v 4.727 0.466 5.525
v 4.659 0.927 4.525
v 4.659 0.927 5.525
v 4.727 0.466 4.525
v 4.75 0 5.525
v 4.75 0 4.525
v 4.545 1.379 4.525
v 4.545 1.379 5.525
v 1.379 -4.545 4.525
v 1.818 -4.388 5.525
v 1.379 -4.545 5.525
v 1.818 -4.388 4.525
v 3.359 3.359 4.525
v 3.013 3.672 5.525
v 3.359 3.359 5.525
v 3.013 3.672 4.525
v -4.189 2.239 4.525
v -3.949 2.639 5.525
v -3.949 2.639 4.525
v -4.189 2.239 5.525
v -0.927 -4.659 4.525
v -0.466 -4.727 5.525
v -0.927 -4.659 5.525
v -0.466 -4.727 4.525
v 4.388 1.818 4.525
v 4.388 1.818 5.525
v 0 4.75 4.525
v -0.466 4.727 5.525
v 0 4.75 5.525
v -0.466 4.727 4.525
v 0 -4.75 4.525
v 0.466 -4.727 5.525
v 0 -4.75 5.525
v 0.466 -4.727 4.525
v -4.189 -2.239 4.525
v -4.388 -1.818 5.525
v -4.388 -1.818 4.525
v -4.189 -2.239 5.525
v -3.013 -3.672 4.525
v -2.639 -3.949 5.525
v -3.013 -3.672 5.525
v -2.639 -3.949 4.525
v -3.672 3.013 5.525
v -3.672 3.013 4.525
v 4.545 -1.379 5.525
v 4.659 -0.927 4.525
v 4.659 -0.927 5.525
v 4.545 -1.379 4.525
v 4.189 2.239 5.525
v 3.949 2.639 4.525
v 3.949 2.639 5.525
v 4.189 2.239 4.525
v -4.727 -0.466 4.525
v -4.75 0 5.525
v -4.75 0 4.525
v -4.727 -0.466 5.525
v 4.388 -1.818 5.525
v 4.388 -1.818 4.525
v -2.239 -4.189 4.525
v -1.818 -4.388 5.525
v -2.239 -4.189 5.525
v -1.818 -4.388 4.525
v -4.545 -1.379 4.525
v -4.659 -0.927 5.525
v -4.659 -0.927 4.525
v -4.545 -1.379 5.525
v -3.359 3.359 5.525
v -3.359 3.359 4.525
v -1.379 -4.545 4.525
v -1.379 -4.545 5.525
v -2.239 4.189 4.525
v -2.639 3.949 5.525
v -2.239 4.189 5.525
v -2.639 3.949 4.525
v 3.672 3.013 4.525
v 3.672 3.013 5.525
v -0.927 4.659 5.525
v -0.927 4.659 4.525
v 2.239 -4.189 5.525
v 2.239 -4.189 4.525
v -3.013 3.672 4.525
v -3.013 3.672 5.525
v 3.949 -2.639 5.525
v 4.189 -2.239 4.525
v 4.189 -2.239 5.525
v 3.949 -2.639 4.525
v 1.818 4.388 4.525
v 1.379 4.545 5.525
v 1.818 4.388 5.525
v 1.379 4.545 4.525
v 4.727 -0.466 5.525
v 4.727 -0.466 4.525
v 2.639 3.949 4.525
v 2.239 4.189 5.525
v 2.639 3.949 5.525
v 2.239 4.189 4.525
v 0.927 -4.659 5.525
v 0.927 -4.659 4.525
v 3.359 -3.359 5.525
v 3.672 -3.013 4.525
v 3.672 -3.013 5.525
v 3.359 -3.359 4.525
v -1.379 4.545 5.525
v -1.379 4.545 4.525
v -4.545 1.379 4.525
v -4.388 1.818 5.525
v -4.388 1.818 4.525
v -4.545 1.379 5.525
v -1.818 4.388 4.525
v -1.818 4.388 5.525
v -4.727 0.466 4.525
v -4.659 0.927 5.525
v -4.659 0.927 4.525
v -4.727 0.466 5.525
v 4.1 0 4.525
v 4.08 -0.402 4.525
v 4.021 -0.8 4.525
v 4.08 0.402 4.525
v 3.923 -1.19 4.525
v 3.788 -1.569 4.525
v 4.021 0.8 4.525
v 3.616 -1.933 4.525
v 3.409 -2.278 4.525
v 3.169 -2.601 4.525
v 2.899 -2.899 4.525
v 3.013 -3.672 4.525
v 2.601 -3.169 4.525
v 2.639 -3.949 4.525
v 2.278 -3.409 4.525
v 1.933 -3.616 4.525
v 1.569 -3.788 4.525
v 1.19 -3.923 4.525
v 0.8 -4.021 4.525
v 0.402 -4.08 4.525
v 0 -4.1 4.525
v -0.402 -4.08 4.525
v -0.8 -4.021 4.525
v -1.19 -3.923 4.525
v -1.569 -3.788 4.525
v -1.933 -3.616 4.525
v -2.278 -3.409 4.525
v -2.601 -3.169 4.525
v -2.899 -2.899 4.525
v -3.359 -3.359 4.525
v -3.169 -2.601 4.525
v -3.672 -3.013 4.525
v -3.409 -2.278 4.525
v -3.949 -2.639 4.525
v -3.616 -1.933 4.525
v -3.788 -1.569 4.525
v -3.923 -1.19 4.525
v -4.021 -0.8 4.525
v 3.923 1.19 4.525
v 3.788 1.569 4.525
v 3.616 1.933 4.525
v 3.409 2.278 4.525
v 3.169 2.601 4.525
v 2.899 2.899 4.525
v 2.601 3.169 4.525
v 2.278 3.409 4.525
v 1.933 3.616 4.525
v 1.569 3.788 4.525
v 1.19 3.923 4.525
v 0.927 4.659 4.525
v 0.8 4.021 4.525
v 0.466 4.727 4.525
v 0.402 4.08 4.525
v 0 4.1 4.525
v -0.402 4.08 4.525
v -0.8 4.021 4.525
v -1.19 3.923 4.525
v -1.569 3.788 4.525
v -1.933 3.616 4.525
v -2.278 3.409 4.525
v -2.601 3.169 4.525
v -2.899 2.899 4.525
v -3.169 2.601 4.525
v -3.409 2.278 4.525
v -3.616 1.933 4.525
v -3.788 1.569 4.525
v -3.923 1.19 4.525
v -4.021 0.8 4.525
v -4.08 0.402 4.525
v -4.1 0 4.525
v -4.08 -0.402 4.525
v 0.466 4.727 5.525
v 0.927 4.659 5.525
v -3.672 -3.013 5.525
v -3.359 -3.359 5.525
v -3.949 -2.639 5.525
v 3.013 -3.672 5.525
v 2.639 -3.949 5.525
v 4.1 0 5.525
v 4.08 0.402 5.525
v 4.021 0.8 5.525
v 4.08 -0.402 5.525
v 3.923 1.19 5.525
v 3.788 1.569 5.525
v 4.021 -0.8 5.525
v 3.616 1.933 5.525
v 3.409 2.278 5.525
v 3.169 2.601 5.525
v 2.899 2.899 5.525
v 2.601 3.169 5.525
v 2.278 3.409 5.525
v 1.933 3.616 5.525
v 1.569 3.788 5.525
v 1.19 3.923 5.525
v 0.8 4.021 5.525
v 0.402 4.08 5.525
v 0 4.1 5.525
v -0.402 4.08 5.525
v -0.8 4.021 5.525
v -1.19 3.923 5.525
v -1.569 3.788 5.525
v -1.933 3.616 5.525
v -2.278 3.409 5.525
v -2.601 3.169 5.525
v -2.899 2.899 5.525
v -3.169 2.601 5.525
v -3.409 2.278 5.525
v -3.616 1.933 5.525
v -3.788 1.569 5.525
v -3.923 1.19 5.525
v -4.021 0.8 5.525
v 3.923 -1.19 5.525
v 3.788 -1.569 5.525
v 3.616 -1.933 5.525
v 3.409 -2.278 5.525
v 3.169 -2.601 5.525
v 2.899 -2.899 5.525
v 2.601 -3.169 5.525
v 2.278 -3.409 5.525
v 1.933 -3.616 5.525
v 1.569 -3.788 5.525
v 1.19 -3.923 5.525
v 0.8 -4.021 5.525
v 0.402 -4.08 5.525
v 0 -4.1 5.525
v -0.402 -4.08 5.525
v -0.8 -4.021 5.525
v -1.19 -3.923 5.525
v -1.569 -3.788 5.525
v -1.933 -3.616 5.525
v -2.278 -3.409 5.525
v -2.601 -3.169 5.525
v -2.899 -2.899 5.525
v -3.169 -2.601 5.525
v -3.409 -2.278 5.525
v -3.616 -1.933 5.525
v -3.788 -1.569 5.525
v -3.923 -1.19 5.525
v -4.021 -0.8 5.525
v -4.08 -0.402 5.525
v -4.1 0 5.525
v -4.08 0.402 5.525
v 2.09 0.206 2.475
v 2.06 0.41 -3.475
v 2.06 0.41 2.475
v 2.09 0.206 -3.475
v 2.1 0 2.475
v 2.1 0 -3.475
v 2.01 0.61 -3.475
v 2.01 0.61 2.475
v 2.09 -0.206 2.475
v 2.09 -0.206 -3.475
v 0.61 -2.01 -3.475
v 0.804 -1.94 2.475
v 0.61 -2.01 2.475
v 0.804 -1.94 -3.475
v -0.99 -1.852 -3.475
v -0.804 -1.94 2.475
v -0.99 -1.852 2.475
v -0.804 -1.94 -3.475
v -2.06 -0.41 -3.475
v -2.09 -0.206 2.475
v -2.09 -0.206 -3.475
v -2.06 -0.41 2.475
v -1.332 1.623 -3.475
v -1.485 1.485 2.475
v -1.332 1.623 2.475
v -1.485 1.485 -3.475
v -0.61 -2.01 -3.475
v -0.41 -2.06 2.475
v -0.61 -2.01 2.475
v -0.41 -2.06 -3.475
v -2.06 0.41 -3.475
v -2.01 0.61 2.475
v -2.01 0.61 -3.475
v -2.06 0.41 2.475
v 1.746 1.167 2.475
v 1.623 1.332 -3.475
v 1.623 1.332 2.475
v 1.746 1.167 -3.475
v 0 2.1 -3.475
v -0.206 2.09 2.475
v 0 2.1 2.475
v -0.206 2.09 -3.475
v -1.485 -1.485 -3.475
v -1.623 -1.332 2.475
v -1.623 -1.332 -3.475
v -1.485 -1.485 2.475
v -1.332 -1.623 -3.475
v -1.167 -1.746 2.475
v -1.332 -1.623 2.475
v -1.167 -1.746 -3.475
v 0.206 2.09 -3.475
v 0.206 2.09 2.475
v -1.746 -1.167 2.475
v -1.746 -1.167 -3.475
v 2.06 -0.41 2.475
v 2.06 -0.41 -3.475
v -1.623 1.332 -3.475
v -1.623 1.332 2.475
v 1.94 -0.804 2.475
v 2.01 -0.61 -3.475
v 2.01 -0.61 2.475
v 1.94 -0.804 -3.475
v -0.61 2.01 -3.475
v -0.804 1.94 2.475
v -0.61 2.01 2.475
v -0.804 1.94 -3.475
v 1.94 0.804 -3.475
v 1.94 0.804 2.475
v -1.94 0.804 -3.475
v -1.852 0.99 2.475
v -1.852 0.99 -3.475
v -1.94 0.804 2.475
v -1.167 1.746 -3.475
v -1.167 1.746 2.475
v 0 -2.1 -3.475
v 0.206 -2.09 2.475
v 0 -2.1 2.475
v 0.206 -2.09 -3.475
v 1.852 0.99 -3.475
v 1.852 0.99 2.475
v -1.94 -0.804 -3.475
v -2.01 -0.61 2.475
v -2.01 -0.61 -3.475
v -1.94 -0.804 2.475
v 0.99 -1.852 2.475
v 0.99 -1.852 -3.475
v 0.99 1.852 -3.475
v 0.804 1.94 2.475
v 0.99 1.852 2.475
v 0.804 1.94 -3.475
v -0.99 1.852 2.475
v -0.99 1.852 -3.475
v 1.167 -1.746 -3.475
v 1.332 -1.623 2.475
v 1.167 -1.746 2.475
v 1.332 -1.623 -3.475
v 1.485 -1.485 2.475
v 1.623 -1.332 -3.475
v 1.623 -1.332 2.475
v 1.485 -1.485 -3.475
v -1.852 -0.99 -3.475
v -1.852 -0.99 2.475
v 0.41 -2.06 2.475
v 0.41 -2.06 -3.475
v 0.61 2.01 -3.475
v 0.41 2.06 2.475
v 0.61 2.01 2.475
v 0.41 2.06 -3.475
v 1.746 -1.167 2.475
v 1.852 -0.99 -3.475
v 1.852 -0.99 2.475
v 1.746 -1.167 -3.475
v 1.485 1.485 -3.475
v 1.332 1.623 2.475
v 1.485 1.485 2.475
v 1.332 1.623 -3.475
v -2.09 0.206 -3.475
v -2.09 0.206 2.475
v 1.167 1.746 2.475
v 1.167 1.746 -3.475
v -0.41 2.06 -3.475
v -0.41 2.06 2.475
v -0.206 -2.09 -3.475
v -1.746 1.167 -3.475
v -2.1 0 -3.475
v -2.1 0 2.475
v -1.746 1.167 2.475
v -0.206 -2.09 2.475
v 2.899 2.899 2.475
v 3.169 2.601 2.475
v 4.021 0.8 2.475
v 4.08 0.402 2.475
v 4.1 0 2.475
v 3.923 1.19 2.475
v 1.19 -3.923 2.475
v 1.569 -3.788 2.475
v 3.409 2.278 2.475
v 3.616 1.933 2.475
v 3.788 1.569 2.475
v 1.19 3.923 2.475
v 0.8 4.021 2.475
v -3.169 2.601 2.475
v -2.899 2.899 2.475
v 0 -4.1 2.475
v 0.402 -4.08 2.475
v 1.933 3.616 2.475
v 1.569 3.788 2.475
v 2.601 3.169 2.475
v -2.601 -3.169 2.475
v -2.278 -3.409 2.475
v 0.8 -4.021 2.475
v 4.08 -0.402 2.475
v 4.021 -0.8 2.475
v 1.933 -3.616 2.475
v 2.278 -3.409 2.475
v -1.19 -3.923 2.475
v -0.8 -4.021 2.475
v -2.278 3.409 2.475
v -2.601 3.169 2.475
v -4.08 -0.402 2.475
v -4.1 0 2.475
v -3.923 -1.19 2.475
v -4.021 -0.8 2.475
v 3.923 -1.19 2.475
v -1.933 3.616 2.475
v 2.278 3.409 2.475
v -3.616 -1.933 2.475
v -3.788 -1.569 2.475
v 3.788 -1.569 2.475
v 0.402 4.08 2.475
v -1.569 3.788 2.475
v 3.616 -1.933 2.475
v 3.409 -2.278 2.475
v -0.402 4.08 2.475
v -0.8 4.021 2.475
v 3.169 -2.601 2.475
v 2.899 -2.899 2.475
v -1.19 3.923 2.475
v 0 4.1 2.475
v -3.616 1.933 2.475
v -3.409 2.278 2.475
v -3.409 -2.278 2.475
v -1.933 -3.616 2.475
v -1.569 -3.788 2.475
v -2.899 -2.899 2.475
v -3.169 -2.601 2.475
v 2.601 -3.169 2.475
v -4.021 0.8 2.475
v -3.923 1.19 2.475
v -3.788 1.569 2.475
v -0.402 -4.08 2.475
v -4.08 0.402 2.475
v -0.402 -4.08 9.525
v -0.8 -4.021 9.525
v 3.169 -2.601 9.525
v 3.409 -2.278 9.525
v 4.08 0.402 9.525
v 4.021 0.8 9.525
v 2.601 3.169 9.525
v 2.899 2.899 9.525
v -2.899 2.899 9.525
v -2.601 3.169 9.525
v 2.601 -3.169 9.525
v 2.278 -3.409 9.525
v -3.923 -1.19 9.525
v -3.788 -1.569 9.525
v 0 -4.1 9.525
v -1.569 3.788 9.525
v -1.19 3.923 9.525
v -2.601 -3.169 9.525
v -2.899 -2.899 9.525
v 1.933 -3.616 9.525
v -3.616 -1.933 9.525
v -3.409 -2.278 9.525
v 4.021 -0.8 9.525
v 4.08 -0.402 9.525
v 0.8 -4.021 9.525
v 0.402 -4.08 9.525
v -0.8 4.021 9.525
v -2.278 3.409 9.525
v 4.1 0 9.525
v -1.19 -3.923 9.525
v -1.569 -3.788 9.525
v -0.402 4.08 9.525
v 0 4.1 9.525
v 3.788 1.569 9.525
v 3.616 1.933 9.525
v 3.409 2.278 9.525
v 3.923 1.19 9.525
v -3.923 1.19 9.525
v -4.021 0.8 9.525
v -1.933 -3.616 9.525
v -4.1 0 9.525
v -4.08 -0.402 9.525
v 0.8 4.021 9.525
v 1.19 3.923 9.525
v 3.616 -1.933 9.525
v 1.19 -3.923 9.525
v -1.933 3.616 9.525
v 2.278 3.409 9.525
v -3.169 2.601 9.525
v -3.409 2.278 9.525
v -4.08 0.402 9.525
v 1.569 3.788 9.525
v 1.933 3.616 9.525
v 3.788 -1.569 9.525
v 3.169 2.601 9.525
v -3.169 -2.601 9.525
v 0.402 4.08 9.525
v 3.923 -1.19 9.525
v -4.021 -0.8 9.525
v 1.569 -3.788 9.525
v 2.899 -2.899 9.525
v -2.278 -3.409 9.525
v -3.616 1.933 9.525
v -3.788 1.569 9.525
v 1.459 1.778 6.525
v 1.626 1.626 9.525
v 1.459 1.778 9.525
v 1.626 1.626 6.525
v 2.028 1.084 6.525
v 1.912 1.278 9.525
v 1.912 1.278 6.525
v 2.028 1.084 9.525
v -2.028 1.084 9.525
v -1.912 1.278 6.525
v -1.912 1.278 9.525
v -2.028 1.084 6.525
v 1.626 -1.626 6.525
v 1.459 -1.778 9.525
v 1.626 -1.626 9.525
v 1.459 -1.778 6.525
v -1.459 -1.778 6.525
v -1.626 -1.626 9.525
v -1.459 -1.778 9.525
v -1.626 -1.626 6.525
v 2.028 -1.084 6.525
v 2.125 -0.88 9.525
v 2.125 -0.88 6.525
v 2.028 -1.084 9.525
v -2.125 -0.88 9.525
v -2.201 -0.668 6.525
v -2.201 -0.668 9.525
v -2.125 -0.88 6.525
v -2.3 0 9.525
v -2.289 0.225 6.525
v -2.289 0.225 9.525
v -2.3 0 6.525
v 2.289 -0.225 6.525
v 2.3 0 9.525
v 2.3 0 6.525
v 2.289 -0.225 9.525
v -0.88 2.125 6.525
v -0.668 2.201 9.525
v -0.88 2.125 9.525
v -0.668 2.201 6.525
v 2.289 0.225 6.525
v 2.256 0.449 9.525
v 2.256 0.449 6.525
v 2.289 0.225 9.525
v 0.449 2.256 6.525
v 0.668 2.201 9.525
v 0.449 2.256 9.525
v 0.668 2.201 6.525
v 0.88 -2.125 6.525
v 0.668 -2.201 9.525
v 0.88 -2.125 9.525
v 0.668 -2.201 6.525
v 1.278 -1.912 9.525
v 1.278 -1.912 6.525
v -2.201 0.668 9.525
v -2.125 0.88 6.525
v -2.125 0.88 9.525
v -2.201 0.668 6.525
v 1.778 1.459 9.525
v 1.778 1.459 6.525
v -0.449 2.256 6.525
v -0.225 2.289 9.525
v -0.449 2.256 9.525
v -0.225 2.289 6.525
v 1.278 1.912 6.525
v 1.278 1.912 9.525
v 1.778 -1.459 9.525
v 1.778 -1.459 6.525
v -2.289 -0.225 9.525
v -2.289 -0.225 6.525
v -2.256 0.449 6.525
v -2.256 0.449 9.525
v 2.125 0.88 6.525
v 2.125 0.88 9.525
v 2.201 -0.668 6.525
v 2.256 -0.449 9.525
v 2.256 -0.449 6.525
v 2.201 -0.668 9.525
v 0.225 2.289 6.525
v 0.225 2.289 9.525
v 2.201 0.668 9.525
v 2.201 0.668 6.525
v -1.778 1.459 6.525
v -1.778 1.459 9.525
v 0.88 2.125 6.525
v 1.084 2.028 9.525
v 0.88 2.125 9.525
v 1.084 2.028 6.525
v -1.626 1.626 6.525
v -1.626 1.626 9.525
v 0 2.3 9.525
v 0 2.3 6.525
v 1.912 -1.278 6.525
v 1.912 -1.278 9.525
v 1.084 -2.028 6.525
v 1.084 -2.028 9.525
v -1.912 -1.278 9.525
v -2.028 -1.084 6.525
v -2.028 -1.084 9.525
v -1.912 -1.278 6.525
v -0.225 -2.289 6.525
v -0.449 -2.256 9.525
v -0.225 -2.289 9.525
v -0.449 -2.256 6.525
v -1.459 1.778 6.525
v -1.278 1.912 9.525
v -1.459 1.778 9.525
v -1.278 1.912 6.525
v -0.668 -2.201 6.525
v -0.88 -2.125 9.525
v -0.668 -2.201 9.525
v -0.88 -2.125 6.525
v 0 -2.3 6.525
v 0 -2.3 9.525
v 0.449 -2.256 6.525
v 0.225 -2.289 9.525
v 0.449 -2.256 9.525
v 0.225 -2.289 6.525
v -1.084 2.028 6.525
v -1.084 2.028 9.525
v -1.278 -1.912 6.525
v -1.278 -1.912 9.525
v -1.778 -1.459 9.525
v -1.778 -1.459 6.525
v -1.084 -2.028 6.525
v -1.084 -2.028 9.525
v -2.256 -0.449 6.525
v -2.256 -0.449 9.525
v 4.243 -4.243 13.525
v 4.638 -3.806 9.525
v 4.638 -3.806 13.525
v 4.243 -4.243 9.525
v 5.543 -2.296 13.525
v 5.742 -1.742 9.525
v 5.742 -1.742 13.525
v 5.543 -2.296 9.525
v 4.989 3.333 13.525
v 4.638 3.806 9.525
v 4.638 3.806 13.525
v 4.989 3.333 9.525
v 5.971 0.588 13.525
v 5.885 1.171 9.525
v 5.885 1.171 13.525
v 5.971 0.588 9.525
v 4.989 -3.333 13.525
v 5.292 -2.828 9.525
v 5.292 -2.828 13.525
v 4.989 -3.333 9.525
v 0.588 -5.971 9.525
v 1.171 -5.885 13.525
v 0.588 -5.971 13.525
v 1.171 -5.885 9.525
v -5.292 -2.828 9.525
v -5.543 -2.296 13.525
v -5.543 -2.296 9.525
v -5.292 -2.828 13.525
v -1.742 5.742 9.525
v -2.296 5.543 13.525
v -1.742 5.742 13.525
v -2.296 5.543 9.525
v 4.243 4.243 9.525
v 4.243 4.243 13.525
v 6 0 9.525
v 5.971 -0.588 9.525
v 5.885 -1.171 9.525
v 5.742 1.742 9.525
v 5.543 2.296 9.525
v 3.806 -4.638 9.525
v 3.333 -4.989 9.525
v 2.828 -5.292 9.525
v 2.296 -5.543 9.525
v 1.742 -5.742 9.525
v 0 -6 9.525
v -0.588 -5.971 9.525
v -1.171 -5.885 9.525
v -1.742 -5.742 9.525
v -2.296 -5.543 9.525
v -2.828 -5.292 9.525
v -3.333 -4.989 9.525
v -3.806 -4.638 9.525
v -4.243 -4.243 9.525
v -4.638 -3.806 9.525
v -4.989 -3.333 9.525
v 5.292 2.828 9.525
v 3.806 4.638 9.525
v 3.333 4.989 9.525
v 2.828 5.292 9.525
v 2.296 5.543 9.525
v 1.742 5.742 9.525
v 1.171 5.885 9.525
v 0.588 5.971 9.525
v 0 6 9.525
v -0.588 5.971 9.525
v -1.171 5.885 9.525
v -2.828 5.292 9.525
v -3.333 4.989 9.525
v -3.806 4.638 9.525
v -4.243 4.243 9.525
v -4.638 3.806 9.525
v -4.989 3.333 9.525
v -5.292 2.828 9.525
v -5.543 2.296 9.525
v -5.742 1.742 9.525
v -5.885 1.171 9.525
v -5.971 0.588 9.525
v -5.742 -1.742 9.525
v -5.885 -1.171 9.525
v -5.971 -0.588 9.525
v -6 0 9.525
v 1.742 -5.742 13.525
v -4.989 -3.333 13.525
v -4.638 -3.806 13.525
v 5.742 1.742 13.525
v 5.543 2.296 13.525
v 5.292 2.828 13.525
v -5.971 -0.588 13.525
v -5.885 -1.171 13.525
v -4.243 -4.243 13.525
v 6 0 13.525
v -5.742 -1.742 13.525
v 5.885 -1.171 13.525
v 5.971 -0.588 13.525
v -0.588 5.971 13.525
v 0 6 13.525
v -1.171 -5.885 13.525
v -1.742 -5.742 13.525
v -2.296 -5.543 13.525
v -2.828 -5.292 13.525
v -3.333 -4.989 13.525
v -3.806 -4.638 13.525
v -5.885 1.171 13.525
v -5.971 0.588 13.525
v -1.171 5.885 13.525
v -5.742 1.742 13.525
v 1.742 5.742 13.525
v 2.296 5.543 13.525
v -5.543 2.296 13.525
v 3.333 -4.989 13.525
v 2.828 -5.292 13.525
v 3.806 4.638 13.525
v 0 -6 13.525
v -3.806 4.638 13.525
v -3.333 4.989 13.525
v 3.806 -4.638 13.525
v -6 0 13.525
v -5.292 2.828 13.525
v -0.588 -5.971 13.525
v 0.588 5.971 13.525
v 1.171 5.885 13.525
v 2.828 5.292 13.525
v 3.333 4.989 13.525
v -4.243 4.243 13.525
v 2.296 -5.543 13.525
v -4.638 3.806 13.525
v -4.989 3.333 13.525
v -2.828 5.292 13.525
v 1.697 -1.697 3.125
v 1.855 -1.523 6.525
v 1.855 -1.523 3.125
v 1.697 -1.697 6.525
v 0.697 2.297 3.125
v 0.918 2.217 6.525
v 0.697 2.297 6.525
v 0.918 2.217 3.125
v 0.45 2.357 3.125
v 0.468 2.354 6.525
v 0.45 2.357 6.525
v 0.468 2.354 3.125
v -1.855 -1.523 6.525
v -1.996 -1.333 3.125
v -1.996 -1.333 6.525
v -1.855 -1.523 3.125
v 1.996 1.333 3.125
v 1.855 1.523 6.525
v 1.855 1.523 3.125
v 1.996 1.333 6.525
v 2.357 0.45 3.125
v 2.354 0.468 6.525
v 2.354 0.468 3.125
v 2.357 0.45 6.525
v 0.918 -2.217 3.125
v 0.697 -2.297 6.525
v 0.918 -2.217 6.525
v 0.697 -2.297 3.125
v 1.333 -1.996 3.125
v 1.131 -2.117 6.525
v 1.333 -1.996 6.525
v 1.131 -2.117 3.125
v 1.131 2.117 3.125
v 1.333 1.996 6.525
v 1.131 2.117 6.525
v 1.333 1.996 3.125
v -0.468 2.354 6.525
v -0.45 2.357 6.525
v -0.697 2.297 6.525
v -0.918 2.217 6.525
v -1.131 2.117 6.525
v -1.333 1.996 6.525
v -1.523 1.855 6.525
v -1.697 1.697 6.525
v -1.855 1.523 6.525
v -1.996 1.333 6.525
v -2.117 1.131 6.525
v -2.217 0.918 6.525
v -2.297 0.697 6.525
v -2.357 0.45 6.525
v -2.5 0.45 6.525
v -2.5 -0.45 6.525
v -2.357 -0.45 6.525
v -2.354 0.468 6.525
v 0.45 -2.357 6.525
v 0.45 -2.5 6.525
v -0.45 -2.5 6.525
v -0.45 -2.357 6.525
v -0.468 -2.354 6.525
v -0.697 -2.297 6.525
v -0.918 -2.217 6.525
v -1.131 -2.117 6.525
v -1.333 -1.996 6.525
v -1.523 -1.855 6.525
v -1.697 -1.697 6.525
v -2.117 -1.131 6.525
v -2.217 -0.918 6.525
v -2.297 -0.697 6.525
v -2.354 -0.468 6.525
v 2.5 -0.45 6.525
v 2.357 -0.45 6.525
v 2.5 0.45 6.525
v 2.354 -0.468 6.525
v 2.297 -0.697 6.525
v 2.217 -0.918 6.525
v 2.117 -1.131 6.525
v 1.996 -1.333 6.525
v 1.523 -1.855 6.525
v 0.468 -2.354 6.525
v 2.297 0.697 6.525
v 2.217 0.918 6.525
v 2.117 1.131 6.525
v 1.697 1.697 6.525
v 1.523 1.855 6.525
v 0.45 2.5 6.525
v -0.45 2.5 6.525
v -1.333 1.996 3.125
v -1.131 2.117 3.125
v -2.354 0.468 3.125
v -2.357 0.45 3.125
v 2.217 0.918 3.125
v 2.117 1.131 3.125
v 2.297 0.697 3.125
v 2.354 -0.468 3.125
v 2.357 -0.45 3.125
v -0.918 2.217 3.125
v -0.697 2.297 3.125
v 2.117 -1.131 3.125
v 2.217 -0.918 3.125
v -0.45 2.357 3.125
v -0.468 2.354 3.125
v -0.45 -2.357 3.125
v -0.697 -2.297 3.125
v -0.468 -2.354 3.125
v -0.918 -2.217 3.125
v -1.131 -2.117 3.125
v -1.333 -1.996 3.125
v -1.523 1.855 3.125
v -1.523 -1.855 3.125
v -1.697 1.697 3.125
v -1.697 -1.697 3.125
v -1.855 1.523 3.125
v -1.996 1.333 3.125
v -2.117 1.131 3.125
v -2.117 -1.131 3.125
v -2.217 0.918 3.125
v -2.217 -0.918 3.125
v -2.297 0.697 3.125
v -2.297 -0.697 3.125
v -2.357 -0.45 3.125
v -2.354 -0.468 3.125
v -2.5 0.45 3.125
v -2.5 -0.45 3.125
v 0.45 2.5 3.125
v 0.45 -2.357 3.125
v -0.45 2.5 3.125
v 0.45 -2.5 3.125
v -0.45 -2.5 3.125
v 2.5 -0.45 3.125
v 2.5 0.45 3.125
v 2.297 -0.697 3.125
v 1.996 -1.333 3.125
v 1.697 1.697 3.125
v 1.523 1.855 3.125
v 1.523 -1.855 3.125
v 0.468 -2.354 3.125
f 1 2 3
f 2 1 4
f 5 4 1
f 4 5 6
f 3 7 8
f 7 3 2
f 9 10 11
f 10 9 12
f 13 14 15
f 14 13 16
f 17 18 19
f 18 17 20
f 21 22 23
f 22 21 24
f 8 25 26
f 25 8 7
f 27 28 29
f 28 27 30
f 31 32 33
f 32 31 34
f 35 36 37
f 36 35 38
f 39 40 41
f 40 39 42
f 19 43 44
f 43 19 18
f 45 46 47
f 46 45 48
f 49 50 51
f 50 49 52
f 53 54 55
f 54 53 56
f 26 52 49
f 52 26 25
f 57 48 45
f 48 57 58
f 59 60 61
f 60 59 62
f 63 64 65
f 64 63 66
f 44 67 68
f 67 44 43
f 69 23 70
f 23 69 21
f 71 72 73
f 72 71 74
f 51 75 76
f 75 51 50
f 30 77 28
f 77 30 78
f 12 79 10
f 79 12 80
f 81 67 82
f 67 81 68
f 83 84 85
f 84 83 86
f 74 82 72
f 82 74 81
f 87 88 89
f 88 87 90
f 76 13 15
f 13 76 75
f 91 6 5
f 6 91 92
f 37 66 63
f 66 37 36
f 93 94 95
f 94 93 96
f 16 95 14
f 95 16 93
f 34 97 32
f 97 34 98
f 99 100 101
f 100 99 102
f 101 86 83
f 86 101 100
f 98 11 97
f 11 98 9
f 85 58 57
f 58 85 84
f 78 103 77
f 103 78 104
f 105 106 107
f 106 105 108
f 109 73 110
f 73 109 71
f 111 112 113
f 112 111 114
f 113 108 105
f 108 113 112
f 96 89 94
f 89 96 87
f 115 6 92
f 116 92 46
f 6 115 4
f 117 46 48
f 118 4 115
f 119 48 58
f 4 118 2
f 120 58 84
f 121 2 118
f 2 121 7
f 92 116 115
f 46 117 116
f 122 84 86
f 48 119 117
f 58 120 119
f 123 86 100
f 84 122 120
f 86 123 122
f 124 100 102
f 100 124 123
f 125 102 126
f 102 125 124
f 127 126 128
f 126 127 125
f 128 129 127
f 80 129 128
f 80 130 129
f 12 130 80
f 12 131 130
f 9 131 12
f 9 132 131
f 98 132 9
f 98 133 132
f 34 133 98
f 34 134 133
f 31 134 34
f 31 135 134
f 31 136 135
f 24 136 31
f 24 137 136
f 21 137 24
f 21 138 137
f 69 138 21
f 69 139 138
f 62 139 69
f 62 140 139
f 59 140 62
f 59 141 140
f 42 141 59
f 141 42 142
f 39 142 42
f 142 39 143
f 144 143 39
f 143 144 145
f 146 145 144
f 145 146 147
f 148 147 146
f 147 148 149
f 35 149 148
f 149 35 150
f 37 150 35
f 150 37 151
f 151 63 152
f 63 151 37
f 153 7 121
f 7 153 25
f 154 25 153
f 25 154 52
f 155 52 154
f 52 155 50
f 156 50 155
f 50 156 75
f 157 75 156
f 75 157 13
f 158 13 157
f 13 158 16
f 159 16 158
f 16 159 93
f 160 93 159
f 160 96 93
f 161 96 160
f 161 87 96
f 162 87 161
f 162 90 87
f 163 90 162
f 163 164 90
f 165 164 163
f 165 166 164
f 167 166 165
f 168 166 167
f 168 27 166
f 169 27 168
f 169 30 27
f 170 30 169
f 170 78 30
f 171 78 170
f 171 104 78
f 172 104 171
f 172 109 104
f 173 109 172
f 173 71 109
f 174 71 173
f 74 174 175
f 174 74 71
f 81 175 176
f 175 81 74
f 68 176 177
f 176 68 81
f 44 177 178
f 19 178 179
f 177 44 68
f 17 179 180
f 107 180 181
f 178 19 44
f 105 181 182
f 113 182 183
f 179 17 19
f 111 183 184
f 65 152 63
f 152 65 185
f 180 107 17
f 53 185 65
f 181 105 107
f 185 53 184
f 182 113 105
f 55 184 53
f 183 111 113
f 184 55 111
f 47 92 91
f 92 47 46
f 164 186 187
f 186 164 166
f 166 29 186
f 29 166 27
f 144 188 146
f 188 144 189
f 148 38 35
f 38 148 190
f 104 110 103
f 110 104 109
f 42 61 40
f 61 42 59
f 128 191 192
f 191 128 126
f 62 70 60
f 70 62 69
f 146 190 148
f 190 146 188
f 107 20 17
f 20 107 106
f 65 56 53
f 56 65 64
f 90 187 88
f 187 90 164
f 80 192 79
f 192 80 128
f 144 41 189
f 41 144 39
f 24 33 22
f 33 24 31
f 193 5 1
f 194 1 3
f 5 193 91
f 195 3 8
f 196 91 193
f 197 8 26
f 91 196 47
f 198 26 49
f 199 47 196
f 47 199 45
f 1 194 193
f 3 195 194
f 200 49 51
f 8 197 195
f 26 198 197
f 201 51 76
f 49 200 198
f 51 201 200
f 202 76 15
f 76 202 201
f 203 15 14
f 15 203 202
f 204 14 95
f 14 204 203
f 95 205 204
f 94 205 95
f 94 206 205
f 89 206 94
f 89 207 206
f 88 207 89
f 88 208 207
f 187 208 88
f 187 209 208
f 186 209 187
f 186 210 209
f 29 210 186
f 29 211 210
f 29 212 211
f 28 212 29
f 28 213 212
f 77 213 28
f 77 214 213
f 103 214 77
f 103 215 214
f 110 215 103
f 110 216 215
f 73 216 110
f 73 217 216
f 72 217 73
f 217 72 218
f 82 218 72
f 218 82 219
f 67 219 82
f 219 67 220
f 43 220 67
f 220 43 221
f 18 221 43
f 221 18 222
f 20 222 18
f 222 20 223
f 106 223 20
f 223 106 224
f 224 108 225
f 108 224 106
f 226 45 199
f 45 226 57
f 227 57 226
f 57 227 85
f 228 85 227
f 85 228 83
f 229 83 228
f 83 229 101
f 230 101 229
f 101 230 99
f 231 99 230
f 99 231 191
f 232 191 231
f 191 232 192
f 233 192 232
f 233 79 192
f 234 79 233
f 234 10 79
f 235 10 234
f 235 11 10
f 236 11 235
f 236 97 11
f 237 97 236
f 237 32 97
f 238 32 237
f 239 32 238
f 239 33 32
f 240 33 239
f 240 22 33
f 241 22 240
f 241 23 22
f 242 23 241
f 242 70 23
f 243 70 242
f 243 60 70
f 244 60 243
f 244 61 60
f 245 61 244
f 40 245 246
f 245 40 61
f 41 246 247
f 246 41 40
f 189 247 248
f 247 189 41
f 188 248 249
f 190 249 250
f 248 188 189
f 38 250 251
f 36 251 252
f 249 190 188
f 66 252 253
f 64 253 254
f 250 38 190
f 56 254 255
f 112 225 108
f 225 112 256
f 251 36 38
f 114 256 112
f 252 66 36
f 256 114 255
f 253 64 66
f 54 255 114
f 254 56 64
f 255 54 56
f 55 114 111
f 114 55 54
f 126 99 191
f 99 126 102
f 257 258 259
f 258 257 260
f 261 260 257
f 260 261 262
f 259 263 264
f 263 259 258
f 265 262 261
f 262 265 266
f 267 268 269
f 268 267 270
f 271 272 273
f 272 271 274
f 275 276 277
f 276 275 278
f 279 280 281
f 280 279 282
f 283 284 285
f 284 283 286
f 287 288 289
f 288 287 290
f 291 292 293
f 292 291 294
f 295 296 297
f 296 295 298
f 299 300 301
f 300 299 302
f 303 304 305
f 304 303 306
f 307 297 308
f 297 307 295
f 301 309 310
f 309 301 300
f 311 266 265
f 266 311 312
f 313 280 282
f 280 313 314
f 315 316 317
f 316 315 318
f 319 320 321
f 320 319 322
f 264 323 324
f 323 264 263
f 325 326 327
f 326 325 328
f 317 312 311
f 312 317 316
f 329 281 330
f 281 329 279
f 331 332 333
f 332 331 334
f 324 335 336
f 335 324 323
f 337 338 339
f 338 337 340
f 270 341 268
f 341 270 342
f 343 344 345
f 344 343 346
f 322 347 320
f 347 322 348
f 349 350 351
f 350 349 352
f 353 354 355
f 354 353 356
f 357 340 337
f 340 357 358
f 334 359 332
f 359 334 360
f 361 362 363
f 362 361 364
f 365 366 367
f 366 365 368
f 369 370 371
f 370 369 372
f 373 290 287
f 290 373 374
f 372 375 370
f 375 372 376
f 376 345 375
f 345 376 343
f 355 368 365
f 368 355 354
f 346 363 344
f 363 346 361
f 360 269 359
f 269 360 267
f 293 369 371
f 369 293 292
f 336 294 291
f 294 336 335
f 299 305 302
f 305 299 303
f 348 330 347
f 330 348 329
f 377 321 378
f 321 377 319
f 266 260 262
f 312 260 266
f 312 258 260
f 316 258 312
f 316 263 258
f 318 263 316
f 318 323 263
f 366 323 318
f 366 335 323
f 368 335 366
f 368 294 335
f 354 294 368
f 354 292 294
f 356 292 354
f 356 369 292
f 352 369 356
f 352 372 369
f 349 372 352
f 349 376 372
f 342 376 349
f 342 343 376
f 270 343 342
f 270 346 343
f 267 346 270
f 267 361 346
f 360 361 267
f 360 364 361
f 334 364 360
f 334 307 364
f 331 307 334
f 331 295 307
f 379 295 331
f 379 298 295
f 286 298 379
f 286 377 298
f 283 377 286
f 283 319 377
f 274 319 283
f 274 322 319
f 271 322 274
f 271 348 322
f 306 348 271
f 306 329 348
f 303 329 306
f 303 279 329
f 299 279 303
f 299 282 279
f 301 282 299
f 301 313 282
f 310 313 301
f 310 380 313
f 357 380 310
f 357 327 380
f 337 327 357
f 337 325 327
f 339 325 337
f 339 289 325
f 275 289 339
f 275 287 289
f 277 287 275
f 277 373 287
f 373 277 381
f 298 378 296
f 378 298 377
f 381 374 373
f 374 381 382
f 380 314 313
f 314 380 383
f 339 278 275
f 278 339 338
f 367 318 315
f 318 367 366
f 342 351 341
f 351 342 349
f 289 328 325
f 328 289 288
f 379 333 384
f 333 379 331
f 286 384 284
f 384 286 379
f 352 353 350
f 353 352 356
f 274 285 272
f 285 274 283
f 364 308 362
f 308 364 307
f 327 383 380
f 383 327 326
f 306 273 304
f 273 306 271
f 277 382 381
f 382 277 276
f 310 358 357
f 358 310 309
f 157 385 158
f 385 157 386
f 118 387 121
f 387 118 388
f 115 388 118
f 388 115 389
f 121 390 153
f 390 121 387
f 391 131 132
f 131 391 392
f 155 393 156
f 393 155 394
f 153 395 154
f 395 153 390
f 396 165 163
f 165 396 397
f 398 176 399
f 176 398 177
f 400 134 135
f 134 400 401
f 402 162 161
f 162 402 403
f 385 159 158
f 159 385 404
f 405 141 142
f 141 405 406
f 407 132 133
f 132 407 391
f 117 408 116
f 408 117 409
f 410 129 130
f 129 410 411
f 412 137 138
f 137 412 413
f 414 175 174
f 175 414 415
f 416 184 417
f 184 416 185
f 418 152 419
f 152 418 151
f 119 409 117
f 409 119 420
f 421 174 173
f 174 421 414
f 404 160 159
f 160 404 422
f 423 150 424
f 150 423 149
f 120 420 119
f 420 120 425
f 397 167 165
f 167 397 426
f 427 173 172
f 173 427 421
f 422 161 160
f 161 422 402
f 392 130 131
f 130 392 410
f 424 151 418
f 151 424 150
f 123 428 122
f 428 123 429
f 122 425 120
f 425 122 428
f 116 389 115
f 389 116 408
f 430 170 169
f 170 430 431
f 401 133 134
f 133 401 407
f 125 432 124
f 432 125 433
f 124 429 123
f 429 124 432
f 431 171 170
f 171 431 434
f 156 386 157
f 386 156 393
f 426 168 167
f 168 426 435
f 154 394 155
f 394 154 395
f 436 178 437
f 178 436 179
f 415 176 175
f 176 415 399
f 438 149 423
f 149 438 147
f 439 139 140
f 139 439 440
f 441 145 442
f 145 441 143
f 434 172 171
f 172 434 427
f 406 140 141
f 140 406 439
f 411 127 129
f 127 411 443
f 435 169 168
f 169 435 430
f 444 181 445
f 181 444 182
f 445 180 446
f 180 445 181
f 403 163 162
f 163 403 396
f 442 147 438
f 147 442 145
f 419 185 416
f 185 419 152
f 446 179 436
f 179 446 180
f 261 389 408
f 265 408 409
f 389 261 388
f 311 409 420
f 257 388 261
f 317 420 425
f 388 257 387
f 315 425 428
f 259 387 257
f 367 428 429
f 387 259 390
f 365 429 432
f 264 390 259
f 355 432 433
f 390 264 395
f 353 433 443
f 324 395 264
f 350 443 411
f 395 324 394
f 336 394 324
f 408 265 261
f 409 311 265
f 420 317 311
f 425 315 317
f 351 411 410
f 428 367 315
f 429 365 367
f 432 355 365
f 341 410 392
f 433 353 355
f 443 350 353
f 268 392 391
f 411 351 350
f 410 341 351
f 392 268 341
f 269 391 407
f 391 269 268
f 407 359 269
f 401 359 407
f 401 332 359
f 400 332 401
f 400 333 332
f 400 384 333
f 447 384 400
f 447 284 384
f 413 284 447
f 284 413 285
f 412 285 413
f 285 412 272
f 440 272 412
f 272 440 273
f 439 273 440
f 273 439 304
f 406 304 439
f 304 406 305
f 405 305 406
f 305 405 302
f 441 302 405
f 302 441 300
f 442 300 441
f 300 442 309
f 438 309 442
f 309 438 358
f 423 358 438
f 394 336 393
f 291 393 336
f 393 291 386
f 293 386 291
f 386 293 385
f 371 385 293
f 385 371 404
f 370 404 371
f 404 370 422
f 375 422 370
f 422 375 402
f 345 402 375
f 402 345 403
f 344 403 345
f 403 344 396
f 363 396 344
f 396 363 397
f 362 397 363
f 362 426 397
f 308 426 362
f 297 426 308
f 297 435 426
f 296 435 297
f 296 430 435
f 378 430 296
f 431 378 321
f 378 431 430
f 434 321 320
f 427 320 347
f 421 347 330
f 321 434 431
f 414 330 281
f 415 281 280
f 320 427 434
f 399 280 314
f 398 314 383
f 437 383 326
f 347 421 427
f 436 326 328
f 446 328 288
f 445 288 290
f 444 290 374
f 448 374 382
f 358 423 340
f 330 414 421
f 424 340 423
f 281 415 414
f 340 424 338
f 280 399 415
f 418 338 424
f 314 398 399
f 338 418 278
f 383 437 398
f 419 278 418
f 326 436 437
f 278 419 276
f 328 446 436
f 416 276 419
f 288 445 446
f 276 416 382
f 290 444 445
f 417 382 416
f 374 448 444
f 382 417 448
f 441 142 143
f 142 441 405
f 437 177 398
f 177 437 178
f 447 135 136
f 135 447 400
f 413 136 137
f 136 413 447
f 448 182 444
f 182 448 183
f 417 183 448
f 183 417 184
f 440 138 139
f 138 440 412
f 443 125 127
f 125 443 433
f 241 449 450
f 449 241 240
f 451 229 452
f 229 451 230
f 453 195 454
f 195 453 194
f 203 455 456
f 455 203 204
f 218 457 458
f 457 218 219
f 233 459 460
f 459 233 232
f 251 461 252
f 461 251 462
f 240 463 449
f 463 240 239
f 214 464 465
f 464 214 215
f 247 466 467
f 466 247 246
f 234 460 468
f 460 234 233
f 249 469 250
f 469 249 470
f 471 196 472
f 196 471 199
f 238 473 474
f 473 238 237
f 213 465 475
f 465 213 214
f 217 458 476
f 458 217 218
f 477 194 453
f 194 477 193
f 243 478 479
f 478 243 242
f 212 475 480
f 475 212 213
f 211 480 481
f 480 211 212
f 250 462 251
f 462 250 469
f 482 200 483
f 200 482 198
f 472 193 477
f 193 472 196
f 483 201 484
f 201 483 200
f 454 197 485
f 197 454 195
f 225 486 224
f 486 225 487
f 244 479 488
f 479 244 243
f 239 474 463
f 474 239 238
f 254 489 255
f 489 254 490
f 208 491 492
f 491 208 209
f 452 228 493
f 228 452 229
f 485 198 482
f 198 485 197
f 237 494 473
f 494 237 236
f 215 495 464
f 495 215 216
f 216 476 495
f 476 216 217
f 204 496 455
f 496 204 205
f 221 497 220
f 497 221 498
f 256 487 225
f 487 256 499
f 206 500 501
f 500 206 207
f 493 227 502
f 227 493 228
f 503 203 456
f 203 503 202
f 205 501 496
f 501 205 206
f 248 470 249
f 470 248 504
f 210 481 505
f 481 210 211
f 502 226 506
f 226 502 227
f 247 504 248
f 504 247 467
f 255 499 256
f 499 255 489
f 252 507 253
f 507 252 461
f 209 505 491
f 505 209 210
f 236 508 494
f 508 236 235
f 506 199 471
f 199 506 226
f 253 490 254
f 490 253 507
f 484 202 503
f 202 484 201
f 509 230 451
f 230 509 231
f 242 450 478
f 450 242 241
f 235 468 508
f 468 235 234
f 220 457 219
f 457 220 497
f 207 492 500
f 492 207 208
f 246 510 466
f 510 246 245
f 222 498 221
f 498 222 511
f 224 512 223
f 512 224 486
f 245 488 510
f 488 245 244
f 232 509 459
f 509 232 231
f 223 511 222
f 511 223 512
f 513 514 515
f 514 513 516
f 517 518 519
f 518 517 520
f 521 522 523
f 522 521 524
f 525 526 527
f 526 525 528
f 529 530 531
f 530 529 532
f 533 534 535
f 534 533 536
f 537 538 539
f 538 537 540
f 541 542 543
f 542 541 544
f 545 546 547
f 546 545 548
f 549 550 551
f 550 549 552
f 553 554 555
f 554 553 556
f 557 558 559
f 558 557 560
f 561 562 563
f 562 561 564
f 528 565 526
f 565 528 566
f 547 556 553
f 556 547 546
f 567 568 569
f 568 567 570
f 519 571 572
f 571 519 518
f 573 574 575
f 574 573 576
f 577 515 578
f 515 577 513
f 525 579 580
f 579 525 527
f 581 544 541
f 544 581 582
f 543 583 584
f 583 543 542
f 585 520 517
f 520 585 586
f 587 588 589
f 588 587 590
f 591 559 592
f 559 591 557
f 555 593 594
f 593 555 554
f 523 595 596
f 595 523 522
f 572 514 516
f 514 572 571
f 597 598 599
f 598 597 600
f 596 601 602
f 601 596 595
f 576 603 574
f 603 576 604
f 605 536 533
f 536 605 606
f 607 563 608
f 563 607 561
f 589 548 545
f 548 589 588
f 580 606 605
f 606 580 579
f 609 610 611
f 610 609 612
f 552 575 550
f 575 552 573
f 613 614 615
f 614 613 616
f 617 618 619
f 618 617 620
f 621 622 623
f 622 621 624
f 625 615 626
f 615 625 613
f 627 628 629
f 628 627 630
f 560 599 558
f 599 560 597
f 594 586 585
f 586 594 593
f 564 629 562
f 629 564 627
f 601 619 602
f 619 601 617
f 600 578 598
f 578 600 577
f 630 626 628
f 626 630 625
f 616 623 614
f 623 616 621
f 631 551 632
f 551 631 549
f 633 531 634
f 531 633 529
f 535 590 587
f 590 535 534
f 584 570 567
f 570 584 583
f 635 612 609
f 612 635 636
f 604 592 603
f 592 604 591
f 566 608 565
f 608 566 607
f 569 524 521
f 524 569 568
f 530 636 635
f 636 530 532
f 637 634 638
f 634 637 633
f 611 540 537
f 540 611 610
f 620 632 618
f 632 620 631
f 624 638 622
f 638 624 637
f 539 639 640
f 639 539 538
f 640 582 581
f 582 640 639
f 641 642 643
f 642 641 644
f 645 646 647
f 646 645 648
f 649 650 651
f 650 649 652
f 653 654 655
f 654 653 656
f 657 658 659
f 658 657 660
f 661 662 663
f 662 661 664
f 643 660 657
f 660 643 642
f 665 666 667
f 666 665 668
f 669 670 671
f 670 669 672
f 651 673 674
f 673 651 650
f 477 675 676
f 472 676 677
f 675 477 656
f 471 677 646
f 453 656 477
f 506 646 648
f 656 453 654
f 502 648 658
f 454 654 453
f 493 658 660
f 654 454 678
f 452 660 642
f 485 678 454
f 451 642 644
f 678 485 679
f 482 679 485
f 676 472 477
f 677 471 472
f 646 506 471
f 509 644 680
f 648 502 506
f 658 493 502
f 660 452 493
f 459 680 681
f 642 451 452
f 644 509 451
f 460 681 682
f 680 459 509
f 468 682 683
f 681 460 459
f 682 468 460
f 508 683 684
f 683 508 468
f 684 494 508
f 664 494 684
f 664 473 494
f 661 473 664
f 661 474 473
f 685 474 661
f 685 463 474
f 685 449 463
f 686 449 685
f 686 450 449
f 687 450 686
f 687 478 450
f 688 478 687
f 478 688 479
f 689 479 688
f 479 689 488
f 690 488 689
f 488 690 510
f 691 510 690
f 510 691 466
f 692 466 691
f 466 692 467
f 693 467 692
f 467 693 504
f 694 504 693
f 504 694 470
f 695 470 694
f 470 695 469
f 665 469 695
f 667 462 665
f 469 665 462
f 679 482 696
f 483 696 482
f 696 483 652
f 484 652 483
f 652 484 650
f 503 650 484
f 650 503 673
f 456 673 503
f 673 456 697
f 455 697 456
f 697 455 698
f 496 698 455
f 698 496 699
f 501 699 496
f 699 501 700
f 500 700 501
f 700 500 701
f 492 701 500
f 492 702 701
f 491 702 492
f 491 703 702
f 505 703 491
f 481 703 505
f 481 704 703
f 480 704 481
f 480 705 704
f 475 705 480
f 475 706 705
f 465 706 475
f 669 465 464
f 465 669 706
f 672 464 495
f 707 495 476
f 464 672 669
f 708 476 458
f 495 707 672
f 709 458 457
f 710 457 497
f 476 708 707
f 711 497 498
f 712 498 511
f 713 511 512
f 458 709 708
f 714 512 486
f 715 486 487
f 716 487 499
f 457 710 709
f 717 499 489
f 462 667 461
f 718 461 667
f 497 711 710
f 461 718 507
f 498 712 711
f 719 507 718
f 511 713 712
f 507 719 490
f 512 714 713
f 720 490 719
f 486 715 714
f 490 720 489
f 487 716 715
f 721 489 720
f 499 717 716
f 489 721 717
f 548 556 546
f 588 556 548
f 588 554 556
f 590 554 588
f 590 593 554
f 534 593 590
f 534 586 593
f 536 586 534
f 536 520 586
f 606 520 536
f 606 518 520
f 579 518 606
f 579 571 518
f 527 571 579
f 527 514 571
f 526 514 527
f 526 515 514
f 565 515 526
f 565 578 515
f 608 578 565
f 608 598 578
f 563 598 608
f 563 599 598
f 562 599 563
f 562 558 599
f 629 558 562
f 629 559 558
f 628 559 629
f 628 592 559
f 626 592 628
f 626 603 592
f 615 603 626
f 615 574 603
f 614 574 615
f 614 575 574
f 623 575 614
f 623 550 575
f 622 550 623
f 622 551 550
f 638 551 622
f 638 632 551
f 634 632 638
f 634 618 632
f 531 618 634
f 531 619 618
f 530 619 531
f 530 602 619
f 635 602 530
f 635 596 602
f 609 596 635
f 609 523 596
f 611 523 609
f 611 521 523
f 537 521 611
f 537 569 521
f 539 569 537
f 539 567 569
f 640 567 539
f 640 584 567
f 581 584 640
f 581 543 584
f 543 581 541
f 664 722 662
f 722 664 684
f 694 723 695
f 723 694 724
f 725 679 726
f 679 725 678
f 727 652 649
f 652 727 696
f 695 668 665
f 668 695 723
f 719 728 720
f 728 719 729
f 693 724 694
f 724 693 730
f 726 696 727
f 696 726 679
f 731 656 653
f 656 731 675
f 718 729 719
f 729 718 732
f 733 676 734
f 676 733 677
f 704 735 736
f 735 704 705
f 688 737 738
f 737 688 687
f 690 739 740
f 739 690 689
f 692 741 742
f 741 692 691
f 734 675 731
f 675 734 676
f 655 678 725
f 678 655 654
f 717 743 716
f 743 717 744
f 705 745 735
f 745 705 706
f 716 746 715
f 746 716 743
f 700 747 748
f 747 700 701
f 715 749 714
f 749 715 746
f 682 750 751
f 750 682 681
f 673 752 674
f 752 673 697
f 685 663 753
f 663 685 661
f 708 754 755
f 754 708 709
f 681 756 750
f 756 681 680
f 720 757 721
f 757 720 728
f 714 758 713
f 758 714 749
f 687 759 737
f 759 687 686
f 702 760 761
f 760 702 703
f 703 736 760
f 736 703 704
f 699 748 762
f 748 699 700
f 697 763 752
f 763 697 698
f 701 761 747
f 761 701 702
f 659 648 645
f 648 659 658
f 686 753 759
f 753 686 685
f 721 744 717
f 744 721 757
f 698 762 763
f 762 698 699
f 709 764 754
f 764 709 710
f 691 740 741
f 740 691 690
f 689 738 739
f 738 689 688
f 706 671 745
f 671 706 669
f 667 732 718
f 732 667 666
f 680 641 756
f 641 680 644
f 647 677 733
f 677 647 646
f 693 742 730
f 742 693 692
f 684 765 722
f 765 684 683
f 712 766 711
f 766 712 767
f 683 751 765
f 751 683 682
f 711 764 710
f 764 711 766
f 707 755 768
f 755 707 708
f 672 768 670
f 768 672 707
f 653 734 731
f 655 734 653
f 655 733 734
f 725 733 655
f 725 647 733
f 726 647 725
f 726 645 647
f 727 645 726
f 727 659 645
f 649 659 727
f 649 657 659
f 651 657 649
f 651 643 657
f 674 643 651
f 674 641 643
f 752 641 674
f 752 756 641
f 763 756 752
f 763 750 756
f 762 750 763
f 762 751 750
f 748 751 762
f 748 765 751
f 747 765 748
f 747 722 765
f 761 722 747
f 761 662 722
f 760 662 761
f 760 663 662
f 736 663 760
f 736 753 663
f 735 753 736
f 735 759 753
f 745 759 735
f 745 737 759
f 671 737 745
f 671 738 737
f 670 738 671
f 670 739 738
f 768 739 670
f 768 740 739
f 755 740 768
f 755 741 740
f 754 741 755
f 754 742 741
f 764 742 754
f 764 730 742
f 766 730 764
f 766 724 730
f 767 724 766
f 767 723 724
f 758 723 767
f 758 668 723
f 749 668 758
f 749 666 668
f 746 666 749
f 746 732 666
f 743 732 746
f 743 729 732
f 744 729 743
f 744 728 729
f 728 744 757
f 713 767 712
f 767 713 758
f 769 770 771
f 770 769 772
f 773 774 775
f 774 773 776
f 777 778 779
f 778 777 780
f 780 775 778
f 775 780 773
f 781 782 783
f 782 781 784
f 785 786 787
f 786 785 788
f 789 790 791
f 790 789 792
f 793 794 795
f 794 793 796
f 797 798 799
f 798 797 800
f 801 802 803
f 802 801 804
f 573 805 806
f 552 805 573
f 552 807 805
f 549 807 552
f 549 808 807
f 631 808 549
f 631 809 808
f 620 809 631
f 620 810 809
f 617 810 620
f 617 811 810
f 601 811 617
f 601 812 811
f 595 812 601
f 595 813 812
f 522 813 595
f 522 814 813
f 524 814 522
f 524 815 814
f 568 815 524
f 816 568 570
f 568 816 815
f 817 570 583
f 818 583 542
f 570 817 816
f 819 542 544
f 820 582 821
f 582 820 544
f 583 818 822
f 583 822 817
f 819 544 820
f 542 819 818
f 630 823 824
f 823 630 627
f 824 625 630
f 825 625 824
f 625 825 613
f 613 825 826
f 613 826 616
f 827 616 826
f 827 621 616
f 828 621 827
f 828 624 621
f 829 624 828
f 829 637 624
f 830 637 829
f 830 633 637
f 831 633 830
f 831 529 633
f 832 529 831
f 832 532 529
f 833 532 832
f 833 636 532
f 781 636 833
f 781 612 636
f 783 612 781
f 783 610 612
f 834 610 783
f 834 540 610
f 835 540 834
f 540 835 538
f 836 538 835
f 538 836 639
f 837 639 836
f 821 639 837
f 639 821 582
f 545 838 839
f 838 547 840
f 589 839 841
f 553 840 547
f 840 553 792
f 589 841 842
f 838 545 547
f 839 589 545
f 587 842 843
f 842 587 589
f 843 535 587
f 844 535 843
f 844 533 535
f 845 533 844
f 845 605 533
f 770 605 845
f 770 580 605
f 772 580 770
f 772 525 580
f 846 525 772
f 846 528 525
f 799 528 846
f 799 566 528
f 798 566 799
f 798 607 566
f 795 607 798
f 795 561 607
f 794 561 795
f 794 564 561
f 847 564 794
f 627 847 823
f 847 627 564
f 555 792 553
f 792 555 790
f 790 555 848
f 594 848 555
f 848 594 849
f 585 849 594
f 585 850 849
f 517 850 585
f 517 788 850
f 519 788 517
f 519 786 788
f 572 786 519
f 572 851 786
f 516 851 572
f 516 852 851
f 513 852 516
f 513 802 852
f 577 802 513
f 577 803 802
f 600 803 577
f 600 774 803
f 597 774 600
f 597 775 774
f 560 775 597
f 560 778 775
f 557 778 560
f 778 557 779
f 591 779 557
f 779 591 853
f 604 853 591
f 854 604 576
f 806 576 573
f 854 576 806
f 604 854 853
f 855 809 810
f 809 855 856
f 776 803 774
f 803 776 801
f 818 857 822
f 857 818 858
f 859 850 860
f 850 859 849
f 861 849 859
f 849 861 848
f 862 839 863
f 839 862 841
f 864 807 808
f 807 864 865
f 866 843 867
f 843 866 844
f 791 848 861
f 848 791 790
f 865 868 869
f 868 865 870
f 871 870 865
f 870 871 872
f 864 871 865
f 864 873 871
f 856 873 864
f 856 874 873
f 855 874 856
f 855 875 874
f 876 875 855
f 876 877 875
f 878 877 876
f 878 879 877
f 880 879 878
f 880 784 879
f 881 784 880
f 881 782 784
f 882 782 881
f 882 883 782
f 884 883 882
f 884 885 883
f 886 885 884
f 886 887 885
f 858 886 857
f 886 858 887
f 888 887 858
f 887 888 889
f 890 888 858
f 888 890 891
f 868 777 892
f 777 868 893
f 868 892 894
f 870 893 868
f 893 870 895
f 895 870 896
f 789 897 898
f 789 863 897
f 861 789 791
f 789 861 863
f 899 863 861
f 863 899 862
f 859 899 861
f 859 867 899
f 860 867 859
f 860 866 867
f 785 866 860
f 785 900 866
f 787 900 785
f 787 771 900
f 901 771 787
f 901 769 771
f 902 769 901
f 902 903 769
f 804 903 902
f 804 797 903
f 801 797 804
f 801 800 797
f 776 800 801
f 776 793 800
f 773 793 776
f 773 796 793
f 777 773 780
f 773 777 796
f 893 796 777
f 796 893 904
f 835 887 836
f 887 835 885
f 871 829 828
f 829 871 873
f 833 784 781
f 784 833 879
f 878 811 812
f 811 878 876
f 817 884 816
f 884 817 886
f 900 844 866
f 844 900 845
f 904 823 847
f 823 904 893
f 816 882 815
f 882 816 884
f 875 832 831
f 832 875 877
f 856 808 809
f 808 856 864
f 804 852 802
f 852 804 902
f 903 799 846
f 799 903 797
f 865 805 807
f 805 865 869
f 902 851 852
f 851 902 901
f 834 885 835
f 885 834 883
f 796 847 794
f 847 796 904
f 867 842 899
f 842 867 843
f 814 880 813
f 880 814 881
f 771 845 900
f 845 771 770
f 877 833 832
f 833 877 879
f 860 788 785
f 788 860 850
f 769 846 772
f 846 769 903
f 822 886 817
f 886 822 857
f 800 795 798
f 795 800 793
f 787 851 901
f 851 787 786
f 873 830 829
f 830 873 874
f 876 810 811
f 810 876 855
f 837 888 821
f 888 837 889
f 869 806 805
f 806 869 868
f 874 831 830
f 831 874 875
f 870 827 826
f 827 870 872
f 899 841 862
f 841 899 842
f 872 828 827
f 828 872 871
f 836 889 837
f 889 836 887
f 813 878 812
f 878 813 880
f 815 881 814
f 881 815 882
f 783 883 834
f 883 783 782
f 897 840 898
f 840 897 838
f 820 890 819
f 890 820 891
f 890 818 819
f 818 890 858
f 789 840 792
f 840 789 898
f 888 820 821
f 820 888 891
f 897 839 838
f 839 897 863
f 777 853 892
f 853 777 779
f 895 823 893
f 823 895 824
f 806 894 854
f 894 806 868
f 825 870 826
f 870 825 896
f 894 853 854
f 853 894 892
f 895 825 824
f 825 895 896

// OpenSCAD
// Parameters
shank_diameter = 4.2; //[2.1:8.4:0.1]
length = 10; //[5:20:0.5]
head_diameter = 8.2; //[4.1:16.4:0.1]
head_height = 3.05; //[1.5:6.1:0.05]
tip_chamfer_height = 0.6; //[0.2:1.5:0.1]
tip_chamfer_radius_reduction = 0.4; //[0.1:1:0.05]
drive_recess_depth = 1.4; //[0.6:2.5:0.1]
drive_recess_radius = 2.4; //[1.2:4.0:0.1]
drive_slot_width = 0.9; //[0.5:1.8:0.05]
drive_slot_length = 5.0; //[2.5:8.0:0.1]
washer_outer_diameter = 9.5; //[6:19:0.1]
washer_thickness = 1.0; //[0.5:2.5:0.1]
washer_hole_diameter = 4.6; //[3.5:7.5:0.1]
pcb_spacer_height = 6.0; //[3.0:12.0:0.5]
pcb_spacer_wall = 1.8; //[1.0:3.6:0.1]
buzzer_radius = 6.0; //[3.0:12.0:0.5]
buzzer_height = 4.0; //[2.0:8.0:0.5]
overlap = 1; //[0.5:2:0.1]

$fn = 64;

// ---- Derived Z layout (all centered on Z, with guaranteed overlaps) ----
shank_len = length - head_height;                 // length of straight shank portion
z_shank_center = 0;
z_shank_top =  shank_len/2;
z_shank_bot = -shank_len/2;

z_head_center = z_shank_top + head_height/2 - overlap;   // overlap into shank
z_head_top = z_head_center + head_height/2;

z_washer_center = z_head_top + washer_thickness/2 - overlap; // overlap into head
z_washer_top = z_washer_center + washer_thickness/2;

z_spacer_center = z_washer_top + pcb_spacer_height/2 - overlap; // overlap into washer
z_spacer_top = z_spacer_center + pcb_spacer_height/2;

z_buzzer_center = z_spacer_top + buzzer_height/2 - overlap; // overlap into spacer

// ---- Screw (missing part) + washer, all physically connected ----
module screw_and_washer() {
  color("DimGray")
  union() {
    // Main shank
    translate([0,0,z_shank_center])
      cylinder(h=shank_len, r=shank_diameter/2, center=true);

    // Tip chamfer (attached to shank with overlap)
    // Place so its top intersects the shank bottom by 'overlap'
    z_tip_center = z_shank_bot - tip_chamfer_height/2 + overlap;
    translate([0,0,z_tip_center])
      cylinder(h=tip_chamfer_height,
               r1=shank_diameter/2,
               r2=shank_diameter/2 - tip_chamfer_radius_reduction,
               center=true);

    // Pan head (attached to shank with overlap)
    translate([0,0,z_head_center])
      cylinder(h=head_height, r=head_diameter/2, center=true);

    // Washer (attached to head with overlap)
    difference() {
      translate([0,0,z_washer_center])
        cylinder(h=washer_thickness, r=washer_outer_diameter/2, center=true);
      translate([0,0,z_washer_center])
        cylinder(h=washer_thickness + 2*overlap, r=washer_hole_diameter/2, center=true);
    }
  }
}

// Drive recess (subtracted from head only; does not create floating solids)
module drive_recess_cut() {
  // Keep the cut fully within the head (slightly extended for robustness)
  z_recess_center = z_head_top - drive_recess_depth/2;
  translate([0,0,z_recess_center])
    union() {
      cylinder(h=drive_recess_depth + 2*overlap, r=drive_recess_radius, center=true);
      // Cross slots
      cube([drive_slot_length, drive_slot_width, drive_recess_depth + 2*overlap], center=true);
      cube([drive_slot_width, drive_slot_length, drive_recess_depth + 2*overlap], center=true);
    }
}

// PCB Spacer - attached to washer with overlap
module pcb_spacer() {
  color("Silver")
  difference() {
    translate([0,0,z_spacer_center])
      cylinder(h=pcb_spacer_height, r=washer_hole_diameter/2 + pcb_spacer_wall, center=true);
    translate([0,0,z_spacer_center])
      cylinder(h=pcb_spacer_height + 2*overlap, r=washer_hole_diameter/2, center=true);
  }
}

// Buzzer - attached to spacer with overlap
module buzzer() {
  color("Black")
  translate([0,0,z_buzzer_center])
    cylinder(h=buzzer_height, r=buzzer_radius, center=true);
}

// Assembly: single connected solid (union), with recess cut applied
module assembly() {
  difference() {
    union() {
      screw_and_washer();
      pcb_spacer();
      buzzer();
    }
    // Subtract recess from the head region
    drive_recess_cut();
  }
}

assembly();
